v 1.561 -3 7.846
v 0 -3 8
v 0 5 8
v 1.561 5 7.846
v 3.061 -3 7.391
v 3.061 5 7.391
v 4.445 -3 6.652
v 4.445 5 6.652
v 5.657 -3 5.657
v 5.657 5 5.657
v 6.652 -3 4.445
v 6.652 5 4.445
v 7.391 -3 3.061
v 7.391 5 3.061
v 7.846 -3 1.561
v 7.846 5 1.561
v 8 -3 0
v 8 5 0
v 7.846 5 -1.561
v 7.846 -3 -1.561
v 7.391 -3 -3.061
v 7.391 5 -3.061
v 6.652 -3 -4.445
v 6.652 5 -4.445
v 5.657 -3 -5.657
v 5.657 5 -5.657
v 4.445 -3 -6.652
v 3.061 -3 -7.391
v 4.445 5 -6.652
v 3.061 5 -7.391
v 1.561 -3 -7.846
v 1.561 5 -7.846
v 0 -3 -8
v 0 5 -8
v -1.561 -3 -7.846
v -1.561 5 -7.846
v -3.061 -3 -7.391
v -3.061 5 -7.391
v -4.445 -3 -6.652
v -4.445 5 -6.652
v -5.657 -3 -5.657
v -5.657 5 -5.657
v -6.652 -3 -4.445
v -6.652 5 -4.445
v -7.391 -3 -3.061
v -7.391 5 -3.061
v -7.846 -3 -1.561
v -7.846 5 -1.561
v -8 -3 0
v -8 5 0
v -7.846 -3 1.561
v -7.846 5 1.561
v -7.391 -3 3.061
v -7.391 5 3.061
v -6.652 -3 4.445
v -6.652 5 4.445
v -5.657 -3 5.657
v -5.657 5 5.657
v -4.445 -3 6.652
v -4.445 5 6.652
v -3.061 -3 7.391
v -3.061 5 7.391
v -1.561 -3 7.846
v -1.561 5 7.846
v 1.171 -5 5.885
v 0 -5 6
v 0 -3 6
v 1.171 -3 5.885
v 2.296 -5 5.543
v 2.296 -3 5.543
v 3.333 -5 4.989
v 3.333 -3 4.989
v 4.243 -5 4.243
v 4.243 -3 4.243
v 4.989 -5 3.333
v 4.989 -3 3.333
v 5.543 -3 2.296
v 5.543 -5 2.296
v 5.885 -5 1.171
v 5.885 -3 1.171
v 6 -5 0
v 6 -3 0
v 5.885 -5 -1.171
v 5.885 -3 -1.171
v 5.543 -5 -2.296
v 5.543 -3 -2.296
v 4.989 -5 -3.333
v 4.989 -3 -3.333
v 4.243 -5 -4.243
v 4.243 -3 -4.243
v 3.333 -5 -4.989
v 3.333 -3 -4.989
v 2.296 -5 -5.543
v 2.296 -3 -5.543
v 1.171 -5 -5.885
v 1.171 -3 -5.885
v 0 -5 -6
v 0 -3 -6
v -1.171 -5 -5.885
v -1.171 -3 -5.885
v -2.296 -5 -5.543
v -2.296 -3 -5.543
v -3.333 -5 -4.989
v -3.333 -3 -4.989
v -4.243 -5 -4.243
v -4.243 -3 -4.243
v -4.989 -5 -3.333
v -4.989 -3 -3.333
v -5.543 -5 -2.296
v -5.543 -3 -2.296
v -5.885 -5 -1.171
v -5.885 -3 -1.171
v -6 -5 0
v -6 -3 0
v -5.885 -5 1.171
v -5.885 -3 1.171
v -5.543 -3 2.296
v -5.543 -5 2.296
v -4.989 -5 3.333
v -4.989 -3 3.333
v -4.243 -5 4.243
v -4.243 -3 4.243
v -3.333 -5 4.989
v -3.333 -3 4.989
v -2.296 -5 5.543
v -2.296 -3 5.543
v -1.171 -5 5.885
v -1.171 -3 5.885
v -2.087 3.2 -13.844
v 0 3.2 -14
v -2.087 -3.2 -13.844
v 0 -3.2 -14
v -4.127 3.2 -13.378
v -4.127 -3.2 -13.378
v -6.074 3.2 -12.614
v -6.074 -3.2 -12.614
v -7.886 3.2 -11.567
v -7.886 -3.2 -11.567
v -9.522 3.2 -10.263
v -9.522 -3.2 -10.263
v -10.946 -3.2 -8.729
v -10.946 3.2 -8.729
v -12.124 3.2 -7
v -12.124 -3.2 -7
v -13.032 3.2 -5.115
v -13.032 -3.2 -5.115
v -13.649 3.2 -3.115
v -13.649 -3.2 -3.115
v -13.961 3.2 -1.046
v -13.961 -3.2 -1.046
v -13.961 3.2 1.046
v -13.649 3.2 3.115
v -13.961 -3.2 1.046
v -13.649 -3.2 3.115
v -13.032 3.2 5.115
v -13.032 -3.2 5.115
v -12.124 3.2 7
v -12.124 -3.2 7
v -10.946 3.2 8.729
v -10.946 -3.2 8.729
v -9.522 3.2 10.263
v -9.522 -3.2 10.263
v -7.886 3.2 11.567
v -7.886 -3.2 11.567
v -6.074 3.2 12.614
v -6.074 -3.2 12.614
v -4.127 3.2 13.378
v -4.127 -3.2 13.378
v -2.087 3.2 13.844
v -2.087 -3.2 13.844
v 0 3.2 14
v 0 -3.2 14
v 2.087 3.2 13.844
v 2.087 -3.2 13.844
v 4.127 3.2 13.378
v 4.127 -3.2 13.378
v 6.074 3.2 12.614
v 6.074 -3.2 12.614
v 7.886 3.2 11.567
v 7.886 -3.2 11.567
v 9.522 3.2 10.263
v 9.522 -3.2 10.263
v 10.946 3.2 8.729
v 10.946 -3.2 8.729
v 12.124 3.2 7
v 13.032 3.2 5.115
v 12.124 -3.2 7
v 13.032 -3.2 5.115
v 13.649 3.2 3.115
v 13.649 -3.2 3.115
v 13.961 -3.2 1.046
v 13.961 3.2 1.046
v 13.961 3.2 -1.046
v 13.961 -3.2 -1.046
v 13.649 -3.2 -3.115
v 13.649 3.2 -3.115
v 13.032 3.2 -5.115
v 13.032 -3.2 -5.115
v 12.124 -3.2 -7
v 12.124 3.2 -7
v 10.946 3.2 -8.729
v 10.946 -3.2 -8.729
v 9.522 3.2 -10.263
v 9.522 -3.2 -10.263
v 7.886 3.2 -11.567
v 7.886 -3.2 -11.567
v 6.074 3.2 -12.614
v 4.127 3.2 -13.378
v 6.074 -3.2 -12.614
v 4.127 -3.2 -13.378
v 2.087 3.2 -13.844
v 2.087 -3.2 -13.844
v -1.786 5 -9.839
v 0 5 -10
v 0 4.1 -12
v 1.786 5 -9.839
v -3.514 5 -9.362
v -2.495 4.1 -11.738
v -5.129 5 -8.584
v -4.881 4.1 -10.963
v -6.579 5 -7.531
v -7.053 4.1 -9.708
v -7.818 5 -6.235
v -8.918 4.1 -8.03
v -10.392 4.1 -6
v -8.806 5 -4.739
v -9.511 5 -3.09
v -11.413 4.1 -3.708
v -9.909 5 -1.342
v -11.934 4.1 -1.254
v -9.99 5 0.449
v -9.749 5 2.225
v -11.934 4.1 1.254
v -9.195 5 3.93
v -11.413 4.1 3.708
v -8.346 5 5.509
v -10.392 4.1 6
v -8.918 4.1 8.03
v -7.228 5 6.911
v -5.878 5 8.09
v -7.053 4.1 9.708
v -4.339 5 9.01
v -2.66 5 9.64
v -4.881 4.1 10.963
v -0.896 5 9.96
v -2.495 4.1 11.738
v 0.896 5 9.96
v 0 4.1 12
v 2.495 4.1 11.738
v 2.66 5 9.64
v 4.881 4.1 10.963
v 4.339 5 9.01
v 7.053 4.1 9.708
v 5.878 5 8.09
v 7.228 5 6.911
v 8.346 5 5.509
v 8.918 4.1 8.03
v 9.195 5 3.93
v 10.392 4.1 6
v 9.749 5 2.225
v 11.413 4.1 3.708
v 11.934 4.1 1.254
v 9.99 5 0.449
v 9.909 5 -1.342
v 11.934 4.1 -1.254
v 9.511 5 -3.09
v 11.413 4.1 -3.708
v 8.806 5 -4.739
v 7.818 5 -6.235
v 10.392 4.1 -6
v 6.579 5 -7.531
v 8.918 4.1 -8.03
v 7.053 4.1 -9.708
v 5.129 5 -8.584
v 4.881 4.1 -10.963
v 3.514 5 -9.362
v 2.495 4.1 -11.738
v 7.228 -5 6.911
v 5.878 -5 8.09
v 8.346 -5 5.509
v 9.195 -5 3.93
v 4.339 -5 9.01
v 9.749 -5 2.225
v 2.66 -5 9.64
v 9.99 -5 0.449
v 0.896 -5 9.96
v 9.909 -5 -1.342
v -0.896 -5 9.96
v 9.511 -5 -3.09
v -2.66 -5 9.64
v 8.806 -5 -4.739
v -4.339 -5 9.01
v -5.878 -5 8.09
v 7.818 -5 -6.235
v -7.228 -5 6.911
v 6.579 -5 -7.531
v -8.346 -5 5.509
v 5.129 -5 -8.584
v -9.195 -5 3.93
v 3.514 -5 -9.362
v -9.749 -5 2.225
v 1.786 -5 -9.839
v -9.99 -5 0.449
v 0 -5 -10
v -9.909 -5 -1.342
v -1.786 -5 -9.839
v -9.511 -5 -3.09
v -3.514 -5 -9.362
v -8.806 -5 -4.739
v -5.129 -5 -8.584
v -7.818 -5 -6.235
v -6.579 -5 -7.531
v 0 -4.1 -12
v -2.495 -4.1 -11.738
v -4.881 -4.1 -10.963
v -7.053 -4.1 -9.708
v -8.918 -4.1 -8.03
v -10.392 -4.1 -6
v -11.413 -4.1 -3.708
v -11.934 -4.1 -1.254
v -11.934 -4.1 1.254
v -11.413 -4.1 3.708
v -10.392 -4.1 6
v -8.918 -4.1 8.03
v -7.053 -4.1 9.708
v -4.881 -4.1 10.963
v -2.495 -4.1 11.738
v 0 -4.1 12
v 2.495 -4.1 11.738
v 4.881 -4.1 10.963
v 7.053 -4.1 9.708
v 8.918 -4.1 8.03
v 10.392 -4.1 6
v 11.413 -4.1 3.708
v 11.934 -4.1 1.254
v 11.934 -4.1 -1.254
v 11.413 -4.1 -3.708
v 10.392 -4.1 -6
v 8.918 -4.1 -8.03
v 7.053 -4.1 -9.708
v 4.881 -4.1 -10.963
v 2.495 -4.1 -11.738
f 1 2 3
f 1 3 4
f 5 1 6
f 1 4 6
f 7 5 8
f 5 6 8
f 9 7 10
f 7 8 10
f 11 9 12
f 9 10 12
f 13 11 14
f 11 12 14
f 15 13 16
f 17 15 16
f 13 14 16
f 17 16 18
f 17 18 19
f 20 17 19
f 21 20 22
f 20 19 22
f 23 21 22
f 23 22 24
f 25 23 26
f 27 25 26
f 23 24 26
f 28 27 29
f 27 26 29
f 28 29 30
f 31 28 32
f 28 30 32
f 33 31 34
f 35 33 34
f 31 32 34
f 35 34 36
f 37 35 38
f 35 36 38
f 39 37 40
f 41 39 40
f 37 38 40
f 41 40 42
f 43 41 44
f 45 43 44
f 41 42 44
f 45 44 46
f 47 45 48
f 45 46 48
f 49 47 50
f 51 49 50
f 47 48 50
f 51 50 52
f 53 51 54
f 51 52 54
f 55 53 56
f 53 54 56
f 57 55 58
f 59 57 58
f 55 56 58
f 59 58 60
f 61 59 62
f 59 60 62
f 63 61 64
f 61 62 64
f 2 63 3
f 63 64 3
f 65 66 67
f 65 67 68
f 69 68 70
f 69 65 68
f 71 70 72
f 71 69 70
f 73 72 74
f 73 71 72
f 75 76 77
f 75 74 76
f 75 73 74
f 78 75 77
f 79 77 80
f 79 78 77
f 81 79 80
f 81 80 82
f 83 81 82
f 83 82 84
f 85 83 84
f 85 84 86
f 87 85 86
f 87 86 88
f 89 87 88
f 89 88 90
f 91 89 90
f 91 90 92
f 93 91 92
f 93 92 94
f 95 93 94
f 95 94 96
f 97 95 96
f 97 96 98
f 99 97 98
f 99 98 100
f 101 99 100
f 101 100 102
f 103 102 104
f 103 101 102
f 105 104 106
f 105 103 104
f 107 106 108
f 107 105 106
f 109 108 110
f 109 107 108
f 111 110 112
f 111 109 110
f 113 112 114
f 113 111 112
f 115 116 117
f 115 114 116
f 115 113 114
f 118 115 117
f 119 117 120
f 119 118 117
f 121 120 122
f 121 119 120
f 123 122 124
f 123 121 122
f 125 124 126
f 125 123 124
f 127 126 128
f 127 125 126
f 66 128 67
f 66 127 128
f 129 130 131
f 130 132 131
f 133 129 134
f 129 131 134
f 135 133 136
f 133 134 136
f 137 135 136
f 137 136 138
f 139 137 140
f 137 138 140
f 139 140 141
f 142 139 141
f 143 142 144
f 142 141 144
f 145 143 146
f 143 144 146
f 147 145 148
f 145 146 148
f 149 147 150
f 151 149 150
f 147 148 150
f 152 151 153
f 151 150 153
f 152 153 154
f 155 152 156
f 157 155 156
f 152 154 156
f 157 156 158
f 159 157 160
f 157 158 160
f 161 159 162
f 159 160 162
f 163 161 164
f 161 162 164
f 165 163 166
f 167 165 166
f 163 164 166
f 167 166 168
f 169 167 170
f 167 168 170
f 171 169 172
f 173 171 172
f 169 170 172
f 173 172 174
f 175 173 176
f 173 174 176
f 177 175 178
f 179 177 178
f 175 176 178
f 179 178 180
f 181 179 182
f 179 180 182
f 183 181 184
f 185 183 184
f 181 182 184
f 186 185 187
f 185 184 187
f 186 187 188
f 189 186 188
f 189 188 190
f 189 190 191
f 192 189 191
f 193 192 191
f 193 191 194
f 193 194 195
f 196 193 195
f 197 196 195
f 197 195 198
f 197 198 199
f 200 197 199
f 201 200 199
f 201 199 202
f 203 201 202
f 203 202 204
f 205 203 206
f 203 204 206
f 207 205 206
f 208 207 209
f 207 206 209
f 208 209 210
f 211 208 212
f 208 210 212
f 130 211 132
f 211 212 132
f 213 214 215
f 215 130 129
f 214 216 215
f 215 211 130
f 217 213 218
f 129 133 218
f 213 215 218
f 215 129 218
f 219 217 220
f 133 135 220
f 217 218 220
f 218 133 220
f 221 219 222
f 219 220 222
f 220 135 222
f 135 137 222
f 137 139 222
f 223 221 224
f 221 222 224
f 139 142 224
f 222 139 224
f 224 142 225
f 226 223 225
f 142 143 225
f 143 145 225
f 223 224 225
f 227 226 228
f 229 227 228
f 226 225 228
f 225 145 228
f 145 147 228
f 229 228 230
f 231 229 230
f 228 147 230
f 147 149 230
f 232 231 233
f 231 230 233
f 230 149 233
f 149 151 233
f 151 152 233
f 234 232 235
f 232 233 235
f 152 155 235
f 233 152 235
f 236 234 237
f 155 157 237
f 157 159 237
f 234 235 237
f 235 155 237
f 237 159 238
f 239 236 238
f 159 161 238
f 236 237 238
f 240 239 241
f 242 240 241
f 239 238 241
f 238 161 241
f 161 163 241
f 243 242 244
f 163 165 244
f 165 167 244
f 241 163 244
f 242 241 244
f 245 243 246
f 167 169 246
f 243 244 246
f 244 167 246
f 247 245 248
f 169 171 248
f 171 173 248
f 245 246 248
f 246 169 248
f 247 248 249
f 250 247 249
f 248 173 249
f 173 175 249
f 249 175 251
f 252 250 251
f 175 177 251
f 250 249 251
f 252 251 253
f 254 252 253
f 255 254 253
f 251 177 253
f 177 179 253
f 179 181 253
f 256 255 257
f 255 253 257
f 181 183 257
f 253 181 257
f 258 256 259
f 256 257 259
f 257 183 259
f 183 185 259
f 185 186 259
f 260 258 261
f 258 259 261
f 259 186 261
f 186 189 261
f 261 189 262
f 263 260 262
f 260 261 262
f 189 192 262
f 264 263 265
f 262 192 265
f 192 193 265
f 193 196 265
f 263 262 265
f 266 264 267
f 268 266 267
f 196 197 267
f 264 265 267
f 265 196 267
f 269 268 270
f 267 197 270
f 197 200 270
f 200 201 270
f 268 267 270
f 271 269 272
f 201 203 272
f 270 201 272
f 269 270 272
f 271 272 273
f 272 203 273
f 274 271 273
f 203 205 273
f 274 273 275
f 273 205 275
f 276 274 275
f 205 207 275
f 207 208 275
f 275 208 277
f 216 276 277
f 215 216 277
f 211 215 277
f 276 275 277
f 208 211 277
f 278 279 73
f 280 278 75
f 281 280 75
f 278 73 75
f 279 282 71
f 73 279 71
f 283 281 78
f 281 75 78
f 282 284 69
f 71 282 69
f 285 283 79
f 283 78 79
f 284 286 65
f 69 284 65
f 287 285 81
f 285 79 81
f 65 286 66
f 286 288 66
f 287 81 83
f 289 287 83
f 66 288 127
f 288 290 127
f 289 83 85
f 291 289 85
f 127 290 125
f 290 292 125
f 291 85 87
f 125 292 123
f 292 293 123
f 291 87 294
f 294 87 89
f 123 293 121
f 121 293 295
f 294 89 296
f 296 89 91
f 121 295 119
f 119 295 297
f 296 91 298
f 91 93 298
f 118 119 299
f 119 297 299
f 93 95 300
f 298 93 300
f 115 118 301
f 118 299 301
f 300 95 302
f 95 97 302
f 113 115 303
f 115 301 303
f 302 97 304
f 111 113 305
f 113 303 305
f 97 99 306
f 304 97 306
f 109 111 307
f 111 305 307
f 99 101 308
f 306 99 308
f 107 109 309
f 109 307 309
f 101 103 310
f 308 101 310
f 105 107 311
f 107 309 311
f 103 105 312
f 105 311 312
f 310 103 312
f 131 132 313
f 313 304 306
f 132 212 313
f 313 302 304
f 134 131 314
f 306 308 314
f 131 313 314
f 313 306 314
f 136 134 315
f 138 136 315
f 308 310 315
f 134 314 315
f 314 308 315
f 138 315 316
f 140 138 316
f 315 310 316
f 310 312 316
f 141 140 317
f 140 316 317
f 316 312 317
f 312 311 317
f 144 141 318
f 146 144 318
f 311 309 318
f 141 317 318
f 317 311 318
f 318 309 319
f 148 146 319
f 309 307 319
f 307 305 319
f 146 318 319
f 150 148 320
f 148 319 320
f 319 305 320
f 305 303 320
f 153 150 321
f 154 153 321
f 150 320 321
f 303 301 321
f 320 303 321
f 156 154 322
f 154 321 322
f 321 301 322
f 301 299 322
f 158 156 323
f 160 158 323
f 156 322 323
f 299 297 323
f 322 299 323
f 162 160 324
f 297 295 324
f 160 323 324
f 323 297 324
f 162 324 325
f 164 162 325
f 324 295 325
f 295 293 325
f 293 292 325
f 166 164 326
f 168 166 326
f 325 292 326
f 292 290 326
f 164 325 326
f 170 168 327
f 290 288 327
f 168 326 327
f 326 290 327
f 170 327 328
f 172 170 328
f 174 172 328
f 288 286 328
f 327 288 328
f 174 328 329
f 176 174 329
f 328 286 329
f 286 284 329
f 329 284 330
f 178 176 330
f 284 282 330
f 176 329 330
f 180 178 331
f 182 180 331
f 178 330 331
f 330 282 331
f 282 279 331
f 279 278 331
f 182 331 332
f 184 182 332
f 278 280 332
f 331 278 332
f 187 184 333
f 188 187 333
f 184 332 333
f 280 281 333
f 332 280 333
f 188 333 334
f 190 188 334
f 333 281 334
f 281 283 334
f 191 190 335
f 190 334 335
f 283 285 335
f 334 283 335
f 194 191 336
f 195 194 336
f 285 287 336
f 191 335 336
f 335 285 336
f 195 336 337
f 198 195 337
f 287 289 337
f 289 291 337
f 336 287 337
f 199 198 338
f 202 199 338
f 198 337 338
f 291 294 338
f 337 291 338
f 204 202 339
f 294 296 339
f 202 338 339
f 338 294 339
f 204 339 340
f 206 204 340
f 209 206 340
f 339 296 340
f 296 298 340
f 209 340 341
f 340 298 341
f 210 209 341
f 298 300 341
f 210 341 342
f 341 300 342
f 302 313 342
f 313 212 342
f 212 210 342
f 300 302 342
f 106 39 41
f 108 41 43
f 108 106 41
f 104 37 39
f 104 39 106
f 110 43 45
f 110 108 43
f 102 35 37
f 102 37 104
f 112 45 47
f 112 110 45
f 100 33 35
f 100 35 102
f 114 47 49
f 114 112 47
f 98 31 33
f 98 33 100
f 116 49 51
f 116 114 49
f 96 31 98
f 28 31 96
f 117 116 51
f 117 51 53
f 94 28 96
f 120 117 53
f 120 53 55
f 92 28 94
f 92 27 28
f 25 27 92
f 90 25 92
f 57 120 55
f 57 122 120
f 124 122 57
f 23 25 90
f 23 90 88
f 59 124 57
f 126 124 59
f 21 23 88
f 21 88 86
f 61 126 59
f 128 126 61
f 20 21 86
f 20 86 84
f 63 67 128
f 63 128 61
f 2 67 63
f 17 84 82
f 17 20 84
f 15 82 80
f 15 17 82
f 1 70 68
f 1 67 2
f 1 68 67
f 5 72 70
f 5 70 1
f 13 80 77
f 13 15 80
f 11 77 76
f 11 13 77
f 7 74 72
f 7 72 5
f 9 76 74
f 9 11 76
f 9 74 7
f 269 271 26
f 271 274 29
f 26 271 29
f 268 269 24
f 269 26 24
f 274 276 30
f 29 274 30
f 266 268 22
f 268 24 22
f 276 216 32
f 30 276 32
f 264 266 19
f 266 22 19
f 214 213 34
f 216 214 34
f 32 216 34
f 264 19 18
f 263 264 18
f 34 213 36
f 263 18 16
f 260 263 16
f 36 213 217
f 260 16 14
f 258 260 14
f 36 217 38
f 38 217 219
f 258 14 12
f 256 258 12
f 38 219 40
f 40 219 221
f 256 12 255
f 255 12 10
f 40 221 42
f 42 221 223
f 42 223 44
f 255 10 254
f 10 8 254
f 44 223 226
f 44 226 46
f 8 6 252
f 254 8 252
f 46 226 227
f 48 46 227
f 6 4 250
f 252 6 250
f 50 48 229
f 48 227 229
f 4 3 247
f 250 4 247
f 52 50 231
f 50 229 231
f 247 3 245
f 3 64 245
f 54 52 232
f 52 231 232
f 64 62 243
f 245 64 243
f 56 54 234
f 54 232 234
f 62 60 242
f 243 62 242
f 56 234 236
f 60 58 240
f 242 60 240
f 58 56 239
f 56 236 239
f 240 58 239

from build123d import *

# Parameters (mm, degrees)
CUT_EXTRUDE_START        = 5
SKETCH_2_R               = 8
CUT_EXTRUDE_1_DEPTH      = 8
CUT_EXTRUDE_2_DEPTH      = 21.420577857
CUT_EXTRUDE_2_DEPTH_BACK = 21.420577857
SKETCH_3_R               = 6


with BuildPart() as part:
    # 草图1 → 旋转1 (revolve)
    with BuildSketch(Plane.XY, mode=Mode.PRIVATE) as revolve_1_sk:
        Polygon((0, 5), (10, 5), (14, 3.2), (14, -3.2), (10, -5), (0, -5), align=None)
    revolve(revolve_1_sk.sketch.rotate(Axis((0, -5, 0), (0, 1, 0)), 90), axis=Axis((0, -5, 0), (0, 1, 0)))

    # 草图2 → 切除-拉伸1 (cut)
    with BuildSketch(Plane(origin=(0, 0, 0), x_dir=(1, 0, 0), z_dir=(0, 1, 0)).offset(CUT_EXTRUDE_START)):
        with Locations(Location((0, 0, 0), (0, 0, 270))):
            Circle(SKETCH_2_R)
    extrude(amount=-CUT_EXTRUDE_1_DEPTH, mode=Mode.SUBTRACT)

    # 草图3 → 切除-拉伸2 (cut, two sides: drawn at the far end of the back side and taken through both)
    with BuildSketch(Plane(origin=(0, 0, 0), x_dir=(1, 0, 0), z_dir=(0, 1, 0)).offset(-CUT_EXTRUDE_2_DEPTH_BACK)):
        with Locations(Location((0, 0, 0), (0, 0, 270))):
            Circle(SKETCH_3_R)
    extrude(amount=CUT_EXTRUDE_2_DEPTH + CUT_EXTRUDE_2_DEPTH_BACK, mode=Mode.SUBTRACT)


solid = part.part
